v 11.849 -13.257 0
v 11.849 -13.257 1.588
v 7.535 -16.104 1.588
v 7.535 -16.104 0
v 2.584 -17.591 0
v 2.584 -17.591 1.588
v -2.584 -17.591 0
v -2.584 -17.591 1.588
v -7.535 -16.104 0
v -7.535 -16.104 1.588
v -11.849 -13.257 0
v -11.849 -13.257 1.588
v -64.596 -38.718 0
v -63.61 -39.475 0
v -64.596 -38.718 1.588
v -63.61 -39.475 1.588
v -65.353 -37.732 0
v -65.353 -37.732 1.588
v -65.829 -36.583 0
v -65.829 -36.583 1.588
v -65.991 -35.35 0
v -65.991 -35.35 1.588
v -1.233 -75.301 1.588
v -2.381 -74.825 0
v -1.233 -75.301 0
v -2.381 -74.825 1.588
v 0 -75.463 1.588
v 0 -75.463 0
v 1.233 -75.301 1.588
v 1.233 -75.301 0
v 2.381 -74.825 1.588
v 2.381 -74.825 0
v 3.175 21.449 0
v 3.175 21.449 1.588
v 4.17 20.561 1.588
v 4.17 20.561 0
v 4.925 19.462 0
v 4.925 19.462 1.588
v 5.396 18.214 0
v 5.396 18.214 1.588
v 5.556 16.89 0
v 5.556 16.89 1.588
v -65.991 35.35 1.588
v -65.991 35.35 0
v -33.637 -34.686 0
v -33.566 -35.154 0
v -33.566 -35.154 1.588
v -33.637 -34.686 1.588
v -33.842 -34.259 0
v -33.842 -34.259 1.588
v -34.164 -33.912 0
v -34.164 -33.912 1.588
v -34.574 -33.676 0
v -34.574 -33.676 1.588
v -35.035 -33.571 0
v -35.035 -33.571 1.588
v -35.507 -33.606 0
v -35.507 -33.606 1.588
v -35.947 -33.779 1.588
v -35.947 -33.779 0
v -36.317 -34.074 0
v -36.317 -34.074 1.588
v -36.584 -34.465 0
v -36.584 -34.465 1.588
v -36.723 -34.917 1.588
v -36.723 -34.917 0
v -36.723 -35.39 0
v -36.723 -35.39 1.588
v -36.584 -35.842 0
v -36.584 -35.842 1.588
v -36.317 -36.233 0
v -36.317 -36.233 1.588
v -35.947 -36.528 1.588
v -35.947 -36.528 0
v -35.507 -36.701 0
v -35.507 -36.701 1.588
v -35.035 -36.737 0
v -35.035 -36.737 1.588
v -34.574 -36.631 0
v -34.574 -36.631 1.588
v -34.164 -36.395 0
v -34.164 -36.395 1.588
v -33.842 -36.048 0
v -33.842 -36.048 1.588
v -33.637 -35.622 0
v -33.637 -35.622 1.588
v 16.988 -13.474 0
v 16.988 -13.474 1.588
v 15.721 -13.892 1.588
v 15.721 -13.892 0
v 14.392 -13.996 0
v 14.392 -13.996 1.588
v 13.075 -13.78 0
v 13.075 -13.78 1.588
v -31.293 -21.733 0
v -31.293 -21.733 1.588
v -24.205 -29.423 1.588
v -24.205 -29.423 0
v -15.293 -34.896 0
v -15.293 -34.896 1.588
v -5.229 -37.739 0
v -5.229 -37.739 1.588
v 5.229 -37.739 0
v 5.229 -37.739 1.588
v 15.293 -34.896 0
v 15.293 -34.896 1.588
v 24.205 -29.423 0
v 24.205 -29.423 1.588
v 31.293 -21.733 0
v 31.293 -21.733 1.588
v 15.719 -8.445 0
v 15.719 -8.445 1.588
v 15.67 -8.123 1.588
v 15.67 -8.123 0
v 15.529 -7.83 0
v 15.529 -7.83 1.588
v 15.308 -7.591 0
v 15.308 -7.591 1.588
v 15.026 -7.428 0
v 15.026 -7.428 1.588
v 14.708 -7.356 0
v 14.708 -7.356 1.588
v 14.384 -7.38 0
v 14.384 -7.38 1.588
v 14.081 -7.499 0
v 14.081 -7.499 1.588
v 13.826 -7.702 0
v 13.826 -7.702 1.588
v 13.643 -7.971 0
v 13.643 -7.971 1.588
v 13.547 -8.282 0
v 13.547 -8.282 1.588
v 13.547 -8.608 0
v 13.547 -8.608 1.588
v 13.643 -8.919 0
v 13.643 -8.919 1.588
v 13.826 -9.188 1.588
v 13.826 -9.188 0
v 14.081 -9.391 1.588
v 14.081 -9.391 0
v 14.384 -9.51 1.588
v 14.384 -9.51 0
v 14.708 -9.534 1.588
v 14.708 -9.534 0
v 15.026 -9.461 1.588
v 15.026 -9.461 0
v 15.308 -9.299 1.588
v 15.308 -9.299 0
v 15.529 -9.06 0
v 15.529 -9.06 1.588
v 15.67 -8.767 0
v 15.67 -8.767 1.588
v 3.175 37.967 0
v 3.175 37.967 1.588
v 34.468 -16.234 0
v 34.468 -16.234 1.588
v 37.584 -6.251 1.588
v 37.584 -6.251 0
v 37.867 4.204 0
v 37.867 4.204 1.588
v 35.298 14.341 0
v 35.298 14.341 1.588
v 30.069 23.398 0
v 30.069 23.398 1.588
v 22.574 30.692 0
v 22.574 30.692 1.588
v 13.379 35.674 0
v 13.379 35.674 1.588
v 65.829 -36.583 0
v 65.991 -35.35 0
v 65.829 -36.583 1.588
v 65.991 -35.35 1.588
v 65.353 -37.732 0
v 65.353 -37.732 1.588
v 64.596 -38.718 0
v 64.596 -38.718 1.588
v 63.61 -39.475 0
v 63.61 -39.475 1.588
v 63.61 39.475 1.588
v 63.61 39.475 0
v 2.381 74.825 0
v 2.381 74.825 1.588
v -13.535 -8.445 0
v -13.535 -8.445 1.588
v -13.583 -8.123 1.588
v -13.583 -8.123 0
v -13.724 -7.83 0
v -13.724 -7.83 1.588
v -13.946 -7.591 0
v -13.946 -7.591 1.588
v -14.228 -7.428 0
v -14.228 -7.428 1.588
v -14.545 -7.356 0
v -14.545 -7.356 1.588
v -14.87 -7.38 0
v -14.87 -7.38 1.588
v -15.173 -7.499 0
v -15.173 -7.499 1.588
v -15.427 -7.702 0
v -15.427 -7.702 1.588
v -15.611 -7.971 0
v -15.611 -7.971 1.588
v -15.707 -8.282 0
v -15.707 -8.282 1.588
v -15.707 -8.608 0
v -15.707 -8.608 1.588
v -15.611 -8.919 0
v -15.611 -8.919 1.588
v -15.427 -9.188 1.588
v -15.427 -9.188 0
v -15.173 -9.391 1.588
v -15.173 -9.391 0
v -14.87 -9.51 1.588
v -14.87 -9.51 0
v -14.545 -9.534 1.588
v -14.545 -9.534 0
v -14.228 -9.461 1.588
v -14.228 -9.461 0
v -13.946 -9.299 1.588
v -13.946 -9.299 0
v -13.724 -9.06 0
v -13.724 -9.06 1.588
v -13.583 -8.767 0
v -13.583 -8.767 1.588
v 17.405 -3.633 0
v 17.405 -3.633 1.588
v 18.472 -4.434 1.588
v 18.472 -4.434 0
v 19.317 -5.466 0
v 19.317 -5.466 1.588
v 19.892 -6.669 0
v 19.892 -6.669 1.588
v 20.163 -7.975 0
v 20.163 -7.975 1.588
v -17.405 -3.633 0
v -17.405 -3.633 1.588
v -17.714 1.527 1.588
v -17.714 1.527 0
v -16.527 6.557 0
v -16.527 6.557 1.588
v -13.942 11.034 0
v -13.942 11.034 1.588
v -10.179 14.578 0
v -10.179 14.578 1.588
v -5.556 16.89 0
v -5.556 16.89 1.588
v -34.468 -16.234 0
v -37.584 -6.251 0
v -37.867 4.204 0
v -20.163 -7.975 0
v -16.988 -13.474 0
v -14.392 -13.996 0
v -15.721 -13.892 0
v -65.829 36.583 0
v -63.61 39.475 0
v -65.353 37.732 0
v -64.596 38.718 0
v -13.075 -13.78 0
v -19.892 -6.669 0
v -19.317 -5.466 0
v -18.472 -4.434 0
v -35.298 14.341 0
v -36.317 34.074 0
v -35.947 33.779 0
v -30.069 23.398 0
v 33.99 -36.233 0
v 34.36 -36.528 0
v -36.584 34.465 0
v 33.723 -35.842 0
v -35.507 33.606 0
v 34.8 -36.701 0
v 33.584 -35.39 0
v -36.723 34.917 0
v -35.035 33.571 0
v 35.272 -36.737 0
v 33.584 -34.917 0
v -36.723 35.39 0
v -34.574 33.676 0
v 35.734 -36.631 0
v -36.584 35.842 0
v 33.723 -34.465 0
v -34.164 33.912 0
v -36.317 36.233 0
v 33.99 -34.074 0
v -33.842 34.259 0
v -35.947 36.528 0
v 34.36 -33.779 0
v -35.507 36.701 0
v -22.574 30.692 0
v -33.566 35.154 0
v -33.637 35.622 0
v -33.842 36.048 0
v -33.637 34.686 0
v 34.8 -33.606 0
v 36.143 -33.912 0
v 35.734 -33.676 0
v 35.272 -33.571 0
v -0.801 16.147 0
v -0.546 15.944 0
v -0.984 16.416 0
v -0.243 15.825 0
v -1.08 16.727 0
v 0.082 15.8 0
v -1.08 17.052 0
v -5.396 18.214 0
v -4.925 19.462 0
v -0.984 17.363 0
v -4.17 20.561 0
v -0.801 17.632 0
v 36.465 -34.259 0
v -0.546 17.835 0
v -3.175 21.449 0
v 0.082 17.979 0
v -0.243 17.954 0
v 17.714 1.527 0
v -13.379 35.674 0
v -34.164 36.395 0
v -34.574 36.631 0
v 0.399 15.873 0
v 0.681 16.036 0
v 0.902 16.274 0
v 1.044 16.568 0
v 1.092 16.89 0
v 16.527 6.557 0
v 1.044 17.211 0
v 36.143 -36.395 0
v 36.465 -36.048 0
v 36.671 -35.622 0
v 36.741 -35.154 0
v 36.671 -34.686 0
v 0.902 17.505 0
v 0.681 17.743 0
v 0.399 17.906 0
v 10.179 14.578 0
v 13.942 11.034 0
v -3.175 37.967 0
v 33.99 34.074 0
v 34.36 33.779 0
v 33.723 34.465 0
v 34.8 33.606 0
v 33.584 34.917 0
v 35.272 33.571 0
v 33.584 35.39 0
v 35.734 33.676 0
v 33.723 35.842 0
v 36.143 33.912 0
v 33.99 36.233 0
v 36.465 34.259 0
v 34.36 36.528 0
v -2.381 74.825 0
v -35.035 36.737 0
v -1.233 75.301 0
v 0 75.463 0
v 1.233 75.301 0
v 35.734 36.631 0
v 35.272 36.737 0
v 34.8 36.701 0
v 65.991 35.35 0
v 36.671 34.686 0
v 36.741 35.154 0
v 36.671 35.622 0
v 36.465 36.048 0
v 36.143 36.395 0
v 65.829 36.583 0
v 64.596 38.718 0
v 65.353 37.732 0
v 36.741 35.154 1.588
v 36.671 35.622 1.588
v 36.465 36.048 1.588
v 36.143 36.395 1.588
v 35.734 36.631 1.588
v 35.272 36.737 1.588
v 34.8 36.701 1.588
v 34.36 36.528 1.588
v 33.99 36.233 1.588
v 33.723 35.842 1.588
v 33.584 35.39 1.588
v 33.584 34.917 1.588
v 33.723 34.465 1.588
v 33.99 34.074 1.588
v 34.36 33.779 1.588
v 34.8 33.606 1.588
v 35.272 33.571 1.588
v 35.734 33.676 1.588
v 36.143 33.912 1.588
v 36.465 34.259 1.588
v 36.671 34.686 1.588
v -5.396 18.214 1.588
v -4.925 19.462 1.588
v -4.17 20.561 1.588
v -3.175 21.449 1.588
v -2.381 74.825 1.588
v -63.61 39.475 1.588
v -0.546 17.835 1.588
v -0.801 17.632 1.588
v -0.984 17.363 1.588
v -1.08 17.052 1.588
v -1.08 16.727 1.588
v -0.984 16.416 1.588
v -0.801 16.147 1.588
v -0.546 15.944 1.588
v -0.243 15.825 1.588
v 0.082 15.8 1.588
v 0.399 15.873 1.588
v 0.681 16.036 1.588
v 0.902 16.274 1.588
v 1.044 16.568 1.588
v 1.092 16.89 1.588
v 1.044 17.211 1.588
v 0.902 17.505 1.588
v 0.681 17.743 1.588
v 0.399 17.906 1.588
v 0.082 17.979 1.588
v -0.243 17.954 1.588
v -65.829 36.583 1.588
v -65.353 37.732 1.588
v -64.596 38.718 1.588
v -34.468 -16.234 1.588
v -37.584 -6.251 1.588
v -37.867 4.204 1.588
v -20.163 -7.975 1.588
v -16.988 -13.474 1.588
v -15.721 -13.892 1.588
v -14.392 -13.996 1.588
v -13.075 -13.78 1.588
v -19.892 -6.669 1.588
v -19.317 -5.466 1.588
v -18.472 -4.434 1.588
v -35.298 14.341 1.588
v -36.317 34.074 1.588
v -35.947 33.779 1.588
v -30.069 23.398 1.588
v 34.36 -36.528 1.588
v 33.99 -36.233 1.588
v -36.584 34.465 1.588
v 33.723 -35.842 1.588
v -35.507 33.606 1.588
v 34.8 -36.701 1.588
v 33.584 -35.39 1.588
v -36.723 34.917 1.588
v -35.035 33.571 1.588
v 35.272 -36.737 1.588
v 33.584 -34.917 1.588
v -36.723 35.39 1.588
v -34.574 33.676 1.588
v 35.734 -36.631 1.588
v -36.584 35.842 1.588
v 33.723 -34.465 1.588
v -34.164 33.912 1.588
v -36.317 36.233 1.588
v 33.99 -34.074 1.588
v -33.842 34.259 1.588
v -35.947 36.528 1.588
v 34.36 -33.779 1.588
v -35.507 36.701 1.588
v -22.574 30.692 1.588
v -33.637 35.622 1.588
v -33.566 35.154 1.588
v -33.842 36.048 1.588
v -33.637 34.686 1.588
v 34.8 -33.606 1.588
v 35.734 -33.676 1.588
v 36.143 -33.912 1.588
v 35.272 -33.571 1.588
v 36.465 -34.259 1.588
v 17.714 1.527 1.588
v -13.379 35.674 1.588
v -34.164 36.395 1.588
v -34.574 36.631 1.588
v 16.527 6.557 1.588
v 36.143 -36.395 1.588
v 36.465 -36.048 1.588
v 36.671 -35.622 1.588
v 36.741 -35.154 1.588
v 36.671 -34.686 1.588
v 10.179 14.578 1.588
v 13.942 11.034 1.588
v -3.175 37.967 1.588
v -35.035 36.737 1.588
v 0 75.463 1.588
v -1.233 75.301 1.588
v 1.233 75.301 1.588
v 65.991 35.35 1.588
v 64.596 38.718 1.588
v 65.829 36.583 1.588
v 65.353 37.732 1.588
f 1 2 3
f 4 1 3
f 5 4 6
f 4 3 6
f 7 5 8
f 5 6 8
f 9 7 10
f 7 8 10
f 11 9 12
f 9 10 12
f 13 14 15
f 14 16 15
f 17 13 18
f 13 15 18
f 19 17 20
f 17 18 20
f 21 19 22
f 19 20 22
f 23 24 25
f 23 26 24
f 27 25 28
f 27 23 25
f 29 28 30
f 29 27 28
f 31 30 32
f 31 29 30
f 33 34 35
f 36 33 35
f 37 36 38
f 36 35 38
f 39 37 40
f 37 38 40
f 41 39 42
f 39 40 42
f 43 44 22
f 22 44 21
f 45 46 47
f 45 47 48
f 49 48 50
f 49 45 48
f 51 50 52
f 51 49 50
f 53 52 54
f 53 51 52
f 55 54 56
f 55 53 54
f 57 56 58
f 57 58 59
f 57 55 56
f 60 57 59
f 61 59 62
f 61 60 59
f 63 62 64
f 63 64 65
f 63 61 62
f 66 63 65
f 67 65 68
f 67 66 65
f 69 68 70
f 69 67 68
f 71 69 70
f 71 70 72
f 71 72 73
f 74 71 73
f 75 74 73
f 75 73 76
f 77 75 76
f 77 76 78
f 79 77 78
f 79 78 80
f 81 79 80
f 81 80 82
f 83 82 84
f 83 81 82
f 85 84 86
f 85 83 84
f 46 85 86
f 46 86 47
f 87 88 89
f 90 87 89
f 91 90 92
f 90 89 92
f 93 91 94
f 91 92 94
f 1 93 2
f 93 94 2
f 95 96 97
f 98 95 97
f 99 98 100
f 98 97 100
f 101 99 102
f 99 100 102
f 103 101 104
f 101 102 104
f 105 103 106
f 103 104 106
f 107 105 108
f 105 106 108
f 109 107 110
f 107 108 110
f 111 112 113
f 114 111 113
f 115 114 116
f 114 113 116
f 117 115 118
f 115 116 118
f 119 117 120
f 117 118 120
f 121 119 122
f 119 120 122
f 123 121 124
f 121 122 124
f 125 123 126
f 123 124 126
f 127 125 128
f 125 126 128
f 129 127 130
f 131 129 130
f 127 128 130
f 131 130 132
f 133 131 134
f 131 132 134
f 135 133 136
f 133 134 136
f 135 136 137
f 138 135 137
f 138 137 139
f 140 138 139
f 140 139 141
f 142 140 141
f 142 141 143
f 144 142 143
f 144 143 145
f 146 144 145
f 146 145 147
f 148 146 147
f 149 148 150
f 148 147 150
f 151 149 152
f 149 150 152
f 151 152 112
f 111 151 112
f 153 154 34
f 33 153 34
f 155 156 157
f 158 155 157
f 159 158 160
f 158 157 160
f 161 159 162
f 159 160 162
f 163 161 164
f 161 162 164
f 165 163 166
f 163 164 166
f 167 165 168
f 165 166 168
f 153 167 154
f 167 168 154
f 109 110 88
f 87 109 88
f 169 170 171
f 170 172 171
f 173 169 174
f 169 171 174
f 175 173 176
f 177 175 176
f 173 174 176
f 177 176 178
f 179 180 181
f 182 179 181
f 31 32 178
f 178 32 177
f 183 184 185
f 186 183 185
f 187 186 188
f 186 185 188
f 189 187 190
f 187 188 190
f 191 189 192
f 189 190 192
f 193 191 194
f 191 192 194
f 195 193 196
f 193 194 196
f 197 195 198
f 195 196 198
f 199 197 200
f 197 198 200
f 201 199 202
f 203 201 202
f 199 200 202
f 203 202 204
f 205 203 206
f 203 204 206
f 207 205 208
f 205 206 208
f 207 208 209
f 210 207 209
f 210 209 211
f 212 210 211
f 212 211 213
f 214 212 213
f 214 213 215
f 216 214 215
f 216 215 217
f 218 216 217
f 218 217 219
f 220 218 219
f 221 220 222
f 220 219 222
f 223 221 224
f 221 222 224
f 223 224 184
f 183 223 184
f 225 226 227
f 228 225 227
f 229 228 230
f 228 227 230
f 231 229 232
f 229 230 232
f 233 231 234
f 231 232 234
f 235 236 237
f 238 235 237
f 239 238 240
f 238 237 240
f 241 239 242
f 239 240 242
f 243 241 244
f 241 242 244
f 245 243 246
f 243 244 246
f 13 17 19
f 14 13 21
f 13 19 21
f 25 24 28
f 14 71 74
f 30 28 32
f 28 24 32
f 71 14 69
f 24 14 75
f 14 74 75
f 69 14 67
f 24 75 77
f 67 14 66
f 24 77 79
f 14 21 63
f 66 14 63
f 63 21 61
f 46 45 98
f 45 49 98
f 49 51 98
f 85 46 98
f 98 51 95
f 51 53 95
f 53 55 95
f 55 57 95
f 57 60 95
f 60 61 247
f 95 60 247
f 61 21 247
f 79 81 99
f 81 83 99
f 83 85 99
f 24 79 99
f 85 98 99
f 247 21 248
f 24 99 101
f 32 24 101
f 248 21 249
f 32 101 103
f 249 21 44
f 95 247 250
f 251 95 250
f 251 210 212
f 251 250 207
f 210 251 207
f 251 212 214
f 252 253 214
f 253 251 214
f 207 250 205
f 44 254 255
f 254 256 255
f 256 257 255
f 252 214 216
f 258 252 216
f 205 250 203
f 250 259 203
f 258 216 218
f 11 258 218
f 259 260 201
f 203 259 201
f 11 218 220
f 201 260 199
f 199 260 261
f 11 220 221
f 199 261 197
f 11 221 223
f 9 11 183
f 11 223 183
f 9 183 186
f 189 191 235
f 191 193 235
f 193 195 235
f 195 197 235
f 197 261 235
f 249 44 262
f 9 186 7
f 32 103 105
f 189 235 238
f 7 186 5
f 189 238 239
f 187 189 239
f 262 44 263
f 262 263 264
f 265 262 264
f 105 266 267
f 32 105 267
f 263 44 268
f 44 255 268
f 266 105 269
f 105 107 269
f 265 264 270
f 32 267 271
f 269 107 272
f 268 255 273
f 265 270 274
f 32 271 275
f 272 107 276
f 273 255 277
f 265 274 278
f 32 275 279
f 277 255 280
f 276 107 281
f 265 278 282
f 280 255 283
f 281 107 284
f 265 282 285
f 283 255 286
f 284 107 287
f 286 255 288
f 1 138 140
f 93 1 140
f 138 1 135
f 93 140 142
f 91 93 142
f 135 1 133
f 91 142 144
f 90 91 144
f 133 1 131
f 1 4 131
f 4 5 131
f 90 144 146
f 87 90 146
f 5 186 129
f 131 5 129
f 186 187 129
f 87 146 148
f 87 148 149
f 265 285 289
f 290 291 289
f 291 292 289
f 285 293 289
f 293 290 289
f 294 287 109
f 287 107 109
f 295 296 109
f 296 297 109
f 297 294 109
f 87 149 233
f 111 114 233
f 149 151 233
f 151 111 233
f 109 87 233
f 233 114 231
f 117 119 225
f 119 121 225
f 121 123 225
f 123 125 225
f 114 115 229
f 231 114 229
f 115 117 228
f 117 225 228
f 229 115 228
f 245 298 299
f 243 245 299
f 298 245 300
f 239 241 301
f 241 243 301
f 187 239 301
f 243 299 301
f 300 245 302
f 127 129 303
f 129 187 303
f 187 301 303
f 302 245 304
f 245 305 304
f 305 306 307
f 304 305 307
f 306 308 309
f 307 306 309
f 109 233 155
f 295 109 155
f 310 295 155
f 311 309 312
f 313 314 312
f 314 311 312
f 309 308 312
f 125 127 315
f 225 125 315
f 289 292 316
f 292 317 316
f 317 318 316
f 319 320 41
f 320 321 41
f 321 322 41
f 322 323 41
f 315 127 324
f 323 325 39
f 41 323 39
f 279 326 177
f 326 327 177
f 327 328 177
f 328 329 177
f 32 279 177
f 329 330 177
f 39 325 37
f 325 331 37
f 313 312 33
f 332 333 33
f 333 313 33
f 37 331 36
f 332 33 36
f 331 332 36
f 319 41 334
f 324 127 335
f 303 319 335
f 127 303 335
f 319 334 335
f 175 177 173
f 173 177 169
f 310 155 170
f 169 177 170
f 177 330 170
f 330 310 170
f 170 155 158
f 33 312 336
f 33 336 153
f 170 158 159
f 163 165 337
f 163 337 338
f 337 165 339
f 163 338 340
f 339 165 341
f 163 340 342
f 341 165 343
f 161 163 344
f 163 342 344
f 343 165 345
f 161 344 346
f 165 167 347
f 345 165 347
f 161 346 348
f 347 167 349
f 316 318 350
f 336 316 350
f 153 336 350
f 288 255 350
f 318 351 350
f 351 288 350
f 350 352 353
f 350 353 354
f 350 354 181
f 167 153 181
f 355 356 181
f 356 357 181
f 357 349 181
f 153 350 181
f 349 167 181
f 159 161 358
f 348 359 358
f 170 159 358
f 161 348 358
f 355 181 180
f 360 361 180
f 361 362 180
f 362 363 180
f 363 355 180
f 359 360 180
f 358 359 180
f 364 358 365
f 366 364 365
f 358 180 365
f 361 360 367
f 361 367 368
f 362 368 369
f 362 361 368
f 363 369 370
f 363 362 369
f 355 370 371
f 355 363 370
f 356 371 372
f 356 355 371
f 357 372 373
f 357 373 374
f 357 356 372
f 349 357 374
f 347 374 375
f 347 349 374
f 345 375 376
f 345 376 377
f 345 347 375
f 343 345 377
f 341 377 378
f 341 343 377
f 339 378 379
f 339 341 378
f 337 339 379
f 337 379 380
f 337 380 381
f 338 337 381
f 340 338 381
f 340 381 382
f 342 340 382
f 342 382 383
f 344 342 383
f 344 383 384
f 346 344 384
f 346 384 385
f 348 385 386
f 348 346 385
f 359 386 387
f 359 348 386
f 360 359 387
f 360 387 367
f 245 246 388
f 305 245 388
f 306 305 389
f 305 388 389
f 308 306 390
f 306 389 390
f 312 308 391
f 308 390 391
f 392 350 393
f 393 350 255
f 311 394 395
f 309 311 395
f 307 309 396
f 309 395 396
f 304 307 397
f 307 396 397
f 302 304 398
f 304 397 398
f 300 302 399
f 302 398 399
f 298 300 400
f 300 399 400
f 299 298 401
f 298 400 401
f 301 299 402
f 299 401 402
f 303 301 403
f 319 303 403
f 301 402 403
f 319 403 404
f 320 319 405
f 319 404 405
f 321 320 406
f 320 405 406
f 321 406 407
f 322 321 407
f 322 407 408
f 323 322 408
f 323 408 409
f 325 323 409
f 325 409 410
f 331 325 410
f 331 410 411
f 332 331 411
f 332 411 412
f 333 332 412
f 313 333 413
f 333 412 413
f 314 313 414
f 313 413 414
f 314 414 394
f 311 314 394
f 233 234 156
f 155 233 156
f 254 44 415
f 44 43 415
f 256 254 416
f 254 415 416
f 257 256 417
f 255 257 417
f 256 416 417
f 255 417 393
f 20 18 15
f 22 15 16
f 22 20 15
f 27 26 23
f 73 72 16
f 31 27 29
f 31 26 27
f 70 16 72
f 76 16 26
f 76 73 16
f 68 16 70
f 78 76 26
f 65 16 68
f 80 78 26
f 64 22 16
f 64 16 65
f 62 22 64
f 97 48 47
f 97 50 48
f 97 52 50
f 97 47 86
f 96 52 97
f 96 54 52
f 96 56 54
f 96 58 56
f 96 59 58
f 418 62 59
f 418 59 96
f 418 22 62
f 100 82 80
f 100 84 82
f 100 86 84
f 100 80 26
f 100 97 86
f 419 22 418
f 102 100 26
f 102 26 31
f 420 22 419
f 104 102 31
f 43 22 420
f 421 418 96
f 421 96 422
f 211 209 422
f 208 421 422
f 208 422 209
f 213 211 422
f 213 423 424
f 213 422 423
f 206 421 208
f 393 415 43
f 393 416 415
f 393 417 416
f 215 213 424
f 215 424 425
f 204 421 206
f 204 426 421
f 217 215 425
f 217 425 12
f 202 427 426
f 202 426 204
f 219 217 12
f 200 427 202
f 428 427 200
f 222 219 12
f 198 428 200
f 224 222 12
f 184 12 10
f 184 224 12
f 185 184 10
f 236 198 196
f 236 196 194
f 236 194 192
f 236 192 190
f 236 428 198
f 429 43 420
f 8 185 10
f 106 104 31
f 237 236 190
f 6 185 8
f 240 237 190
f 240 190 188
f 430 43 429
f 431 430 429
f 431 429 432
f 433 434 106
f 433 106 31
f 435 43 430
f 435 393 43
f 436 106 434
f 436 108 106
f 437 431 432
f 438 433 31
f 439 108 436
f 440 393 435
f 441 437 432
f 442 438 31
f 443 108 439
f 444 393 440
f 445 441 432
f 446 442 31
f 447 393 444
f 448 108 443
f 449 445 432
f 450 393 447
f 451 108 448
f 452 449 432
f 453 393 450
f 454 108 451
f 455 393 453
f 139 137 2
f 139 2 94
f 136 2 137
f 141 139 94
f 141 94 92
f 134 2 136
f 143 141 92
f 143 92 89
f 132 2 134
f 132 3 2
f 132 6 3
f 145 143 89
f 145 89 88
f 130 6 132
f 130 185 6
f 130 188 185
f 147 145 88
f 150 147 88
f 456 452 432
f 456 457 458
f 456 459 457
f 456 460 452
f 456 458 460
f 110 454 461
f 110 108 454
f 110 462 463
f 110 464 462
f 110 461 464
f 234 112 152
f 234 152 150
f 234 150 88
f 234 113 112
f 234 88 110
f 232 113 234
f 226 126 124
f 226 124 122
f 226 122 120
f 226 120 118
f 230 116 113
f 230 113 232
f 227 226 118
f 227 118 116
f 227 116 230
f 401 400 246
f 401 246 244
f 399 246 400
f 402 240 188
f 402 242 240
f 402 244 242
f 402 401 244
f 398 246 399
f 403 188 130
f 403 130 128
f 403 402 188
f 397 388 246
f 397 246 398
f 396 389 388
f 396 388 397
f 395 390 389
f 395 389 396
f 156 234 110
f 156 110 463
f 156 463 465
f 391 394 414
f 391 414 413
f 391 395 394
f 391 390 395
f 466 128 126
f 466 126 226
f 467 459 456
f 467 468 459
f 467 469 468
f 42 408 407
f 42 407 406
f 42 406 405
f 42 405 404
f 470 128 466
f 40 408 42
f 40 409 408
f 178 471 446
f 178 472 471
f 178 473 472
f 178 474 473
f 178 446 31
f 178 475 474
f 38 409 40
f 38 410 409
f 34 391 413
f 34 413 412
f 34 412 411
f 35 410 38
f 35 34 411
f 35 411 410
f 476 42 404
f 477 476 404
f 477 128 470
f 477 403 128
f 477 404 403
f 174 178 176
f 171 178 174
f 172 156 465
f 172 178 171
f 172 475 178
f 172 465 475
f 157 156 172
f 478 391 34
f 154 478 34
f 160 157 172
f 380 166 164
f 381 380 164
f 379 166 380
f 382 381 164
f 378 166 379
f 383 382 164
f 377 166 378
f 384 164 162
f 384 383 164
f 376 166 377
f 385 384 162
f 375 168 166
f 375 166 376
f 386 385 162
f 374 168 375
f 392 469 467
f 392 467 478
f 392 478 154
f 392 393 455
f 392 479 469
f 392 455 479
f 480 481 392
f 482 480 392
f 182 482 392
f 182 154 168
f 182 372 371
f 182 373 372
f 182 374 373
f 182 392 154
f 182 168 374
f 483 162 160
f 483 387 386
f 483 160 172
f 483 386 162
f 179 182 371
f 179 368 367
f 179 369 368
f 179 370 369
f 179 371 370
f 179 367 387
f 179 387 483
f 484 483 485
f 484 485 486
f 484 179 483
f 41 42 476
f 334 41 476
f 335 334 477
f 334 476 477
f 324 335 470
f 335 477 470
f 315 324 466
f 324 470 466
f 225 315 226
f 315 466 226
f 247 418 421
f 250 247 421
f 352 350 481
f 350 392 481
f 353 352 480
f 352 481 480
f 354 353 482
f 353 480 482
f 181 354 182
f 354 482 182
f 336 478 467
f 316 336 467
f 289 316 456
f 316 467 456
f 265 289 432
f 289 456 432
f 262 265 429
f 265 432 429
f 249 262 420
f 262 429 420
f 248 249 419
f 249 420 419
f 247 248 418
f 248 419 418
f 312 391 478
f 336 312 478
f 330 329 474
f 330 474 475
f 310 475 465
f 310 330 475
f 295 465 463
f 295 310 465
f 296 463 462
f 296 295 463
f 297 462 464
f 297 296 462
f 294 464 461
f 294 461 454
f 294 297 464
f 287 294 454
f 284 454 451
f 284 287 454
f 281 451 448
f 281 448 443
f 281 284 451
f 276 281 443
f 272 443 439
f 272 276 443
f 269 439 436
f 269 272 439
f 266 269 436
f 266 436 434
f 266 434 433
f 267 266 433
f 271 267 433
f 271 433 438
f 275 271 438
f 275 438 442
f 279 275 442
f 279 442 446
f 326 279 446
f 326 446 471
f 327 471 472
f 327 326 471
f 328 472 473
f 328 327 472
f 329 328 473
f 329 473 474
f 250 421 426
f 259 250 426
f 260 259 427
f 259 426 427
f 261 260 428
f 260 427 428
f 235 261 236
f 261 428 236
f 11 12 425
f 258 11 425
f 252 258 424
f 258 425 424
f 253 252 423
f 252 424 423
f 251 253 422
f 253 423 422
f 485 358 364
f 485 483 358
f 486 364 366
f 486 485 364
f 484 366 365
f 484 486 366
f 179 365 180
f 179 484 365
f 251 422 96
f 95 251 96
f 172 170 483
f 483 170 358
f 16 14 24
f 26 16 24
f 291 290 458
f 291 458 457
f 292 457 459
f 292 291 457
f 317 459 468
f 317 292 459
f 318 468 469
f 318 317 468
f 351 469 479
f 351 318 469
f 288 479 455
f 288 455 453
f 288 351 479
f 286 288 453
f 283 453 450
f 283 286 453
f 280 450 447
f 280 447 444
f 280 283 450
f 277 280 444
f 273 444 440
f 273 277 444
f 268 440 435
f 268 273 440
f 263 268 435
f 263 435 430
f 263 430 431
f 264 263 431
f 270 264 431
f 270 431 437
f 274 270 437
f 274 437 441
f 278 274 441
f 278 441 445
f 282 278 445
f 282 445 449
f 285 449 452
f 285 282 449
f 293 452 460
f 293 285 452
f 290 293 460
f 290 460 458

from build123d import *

# Parameters (mm, degrees)
F0_R            = 1.5875
F1_DEPTH        = 1.5875
F2_R            = 1.0922
F3_DEPTH        = 1.5875
F3_COPIES_COUNT = 3
F4_R            = 4.7625


# Not quite as in the source:
# - a pattern or mirror of a feature is missing from the dataset's text; its kind, count and spacing are read off the source's solid


with BuildPart() as f1:
    # F0 (on Top) → F1 (new body)
    with BuildSketch(Plane.XY):
        Polygon((65.9911357684, -38.1), (65.9911357684, 38.1), (0, 76.2), (-65.9911357684, 38.1), (-65.9911357684, -38.1), (0, -76.2), align=None)
        with Locations((-35.1536, -35.1536)):
            Circle(F0_R, mode=Mode.SUBTRACT)
        with Locations((35.1536, -35.1536)):
            Circle(F0_R, mode=Mode.SUBTRACT)
        with Locations((-35.1536, 35.1536)):
            Circle(F0_R, mode=Mode.SUBTRACT)
        with Locations((35.1536, 35.1536)):
            Circle(F0_R, mode=Mode.SUBTRACT)
    extrude(amount=F1_DEPTH)

    # F2 (on face) → F3 (cut, through all)
    with BuildSketch(Plane.XY.offset(1.5875)):
        with BuildLine():
            ThreePointArc((11.8486437632, -13.2566225326), (0, -17.78), (-11.8486437632, -13.2566225326))
            ThreePointArc((-11.8486437632, -13.2566225326), (-14.3916795622, -13.9960432527), (-16.9881251543, -13.4742728402))
            Line((-16.9881251543, -13.4742728402), (-31.2933003438, -21.7333695867))
            ThreePointArc((-31.2933003438, -21.7333695867), (0, -38.1), (31.2933003438, -21.7333695867))
            Line((31.2933003438, -21.7333695867), (16.9881251543, -13.4742728402))
            ThreePointArc((16.9881251543, -13.4742728402), (14.3916795622, -13.9960432527), (11.8486437632, -13.2566225326))
        make_face()
        with Locations((14.6267687632, -8.4447688828)):
            Circle(F2_R)
        with Locations((-14.6267687632, -8.4447688828)):
            Circle(F2_R)
    f3 = extrude(amount=-F3_DEPTH, mode=Mode.SUBTRACT)

    # F3_copies: F3 ×3 about axis
    f3_copies_axis = Axis((0, 0, 0), (0, 0, 1))
    for i in range(1, F3_COPIES_COUNT):
        add(f3.rotate(f3_copies_axis, i * 360 / F3_COPIES_COUNT), mode=Mode.SUBTRACT)

    # F4
    f4_edges = [f1.edges().sort_by_distance(p)[0] for p in [
        (-65.991136, 38.1, 0.79375),
        (0, 76.2, 0.79375),
        (65.991136, 38.1, 0.79375),
        (65.991136, -38.1, 0.79375),
        (0, -76.2, 0.79375),
        (-65.991136, -38.1, 0.79375),
    ]]
    fillet(f4_edges, radius=F4_R)


solid = f1.part
